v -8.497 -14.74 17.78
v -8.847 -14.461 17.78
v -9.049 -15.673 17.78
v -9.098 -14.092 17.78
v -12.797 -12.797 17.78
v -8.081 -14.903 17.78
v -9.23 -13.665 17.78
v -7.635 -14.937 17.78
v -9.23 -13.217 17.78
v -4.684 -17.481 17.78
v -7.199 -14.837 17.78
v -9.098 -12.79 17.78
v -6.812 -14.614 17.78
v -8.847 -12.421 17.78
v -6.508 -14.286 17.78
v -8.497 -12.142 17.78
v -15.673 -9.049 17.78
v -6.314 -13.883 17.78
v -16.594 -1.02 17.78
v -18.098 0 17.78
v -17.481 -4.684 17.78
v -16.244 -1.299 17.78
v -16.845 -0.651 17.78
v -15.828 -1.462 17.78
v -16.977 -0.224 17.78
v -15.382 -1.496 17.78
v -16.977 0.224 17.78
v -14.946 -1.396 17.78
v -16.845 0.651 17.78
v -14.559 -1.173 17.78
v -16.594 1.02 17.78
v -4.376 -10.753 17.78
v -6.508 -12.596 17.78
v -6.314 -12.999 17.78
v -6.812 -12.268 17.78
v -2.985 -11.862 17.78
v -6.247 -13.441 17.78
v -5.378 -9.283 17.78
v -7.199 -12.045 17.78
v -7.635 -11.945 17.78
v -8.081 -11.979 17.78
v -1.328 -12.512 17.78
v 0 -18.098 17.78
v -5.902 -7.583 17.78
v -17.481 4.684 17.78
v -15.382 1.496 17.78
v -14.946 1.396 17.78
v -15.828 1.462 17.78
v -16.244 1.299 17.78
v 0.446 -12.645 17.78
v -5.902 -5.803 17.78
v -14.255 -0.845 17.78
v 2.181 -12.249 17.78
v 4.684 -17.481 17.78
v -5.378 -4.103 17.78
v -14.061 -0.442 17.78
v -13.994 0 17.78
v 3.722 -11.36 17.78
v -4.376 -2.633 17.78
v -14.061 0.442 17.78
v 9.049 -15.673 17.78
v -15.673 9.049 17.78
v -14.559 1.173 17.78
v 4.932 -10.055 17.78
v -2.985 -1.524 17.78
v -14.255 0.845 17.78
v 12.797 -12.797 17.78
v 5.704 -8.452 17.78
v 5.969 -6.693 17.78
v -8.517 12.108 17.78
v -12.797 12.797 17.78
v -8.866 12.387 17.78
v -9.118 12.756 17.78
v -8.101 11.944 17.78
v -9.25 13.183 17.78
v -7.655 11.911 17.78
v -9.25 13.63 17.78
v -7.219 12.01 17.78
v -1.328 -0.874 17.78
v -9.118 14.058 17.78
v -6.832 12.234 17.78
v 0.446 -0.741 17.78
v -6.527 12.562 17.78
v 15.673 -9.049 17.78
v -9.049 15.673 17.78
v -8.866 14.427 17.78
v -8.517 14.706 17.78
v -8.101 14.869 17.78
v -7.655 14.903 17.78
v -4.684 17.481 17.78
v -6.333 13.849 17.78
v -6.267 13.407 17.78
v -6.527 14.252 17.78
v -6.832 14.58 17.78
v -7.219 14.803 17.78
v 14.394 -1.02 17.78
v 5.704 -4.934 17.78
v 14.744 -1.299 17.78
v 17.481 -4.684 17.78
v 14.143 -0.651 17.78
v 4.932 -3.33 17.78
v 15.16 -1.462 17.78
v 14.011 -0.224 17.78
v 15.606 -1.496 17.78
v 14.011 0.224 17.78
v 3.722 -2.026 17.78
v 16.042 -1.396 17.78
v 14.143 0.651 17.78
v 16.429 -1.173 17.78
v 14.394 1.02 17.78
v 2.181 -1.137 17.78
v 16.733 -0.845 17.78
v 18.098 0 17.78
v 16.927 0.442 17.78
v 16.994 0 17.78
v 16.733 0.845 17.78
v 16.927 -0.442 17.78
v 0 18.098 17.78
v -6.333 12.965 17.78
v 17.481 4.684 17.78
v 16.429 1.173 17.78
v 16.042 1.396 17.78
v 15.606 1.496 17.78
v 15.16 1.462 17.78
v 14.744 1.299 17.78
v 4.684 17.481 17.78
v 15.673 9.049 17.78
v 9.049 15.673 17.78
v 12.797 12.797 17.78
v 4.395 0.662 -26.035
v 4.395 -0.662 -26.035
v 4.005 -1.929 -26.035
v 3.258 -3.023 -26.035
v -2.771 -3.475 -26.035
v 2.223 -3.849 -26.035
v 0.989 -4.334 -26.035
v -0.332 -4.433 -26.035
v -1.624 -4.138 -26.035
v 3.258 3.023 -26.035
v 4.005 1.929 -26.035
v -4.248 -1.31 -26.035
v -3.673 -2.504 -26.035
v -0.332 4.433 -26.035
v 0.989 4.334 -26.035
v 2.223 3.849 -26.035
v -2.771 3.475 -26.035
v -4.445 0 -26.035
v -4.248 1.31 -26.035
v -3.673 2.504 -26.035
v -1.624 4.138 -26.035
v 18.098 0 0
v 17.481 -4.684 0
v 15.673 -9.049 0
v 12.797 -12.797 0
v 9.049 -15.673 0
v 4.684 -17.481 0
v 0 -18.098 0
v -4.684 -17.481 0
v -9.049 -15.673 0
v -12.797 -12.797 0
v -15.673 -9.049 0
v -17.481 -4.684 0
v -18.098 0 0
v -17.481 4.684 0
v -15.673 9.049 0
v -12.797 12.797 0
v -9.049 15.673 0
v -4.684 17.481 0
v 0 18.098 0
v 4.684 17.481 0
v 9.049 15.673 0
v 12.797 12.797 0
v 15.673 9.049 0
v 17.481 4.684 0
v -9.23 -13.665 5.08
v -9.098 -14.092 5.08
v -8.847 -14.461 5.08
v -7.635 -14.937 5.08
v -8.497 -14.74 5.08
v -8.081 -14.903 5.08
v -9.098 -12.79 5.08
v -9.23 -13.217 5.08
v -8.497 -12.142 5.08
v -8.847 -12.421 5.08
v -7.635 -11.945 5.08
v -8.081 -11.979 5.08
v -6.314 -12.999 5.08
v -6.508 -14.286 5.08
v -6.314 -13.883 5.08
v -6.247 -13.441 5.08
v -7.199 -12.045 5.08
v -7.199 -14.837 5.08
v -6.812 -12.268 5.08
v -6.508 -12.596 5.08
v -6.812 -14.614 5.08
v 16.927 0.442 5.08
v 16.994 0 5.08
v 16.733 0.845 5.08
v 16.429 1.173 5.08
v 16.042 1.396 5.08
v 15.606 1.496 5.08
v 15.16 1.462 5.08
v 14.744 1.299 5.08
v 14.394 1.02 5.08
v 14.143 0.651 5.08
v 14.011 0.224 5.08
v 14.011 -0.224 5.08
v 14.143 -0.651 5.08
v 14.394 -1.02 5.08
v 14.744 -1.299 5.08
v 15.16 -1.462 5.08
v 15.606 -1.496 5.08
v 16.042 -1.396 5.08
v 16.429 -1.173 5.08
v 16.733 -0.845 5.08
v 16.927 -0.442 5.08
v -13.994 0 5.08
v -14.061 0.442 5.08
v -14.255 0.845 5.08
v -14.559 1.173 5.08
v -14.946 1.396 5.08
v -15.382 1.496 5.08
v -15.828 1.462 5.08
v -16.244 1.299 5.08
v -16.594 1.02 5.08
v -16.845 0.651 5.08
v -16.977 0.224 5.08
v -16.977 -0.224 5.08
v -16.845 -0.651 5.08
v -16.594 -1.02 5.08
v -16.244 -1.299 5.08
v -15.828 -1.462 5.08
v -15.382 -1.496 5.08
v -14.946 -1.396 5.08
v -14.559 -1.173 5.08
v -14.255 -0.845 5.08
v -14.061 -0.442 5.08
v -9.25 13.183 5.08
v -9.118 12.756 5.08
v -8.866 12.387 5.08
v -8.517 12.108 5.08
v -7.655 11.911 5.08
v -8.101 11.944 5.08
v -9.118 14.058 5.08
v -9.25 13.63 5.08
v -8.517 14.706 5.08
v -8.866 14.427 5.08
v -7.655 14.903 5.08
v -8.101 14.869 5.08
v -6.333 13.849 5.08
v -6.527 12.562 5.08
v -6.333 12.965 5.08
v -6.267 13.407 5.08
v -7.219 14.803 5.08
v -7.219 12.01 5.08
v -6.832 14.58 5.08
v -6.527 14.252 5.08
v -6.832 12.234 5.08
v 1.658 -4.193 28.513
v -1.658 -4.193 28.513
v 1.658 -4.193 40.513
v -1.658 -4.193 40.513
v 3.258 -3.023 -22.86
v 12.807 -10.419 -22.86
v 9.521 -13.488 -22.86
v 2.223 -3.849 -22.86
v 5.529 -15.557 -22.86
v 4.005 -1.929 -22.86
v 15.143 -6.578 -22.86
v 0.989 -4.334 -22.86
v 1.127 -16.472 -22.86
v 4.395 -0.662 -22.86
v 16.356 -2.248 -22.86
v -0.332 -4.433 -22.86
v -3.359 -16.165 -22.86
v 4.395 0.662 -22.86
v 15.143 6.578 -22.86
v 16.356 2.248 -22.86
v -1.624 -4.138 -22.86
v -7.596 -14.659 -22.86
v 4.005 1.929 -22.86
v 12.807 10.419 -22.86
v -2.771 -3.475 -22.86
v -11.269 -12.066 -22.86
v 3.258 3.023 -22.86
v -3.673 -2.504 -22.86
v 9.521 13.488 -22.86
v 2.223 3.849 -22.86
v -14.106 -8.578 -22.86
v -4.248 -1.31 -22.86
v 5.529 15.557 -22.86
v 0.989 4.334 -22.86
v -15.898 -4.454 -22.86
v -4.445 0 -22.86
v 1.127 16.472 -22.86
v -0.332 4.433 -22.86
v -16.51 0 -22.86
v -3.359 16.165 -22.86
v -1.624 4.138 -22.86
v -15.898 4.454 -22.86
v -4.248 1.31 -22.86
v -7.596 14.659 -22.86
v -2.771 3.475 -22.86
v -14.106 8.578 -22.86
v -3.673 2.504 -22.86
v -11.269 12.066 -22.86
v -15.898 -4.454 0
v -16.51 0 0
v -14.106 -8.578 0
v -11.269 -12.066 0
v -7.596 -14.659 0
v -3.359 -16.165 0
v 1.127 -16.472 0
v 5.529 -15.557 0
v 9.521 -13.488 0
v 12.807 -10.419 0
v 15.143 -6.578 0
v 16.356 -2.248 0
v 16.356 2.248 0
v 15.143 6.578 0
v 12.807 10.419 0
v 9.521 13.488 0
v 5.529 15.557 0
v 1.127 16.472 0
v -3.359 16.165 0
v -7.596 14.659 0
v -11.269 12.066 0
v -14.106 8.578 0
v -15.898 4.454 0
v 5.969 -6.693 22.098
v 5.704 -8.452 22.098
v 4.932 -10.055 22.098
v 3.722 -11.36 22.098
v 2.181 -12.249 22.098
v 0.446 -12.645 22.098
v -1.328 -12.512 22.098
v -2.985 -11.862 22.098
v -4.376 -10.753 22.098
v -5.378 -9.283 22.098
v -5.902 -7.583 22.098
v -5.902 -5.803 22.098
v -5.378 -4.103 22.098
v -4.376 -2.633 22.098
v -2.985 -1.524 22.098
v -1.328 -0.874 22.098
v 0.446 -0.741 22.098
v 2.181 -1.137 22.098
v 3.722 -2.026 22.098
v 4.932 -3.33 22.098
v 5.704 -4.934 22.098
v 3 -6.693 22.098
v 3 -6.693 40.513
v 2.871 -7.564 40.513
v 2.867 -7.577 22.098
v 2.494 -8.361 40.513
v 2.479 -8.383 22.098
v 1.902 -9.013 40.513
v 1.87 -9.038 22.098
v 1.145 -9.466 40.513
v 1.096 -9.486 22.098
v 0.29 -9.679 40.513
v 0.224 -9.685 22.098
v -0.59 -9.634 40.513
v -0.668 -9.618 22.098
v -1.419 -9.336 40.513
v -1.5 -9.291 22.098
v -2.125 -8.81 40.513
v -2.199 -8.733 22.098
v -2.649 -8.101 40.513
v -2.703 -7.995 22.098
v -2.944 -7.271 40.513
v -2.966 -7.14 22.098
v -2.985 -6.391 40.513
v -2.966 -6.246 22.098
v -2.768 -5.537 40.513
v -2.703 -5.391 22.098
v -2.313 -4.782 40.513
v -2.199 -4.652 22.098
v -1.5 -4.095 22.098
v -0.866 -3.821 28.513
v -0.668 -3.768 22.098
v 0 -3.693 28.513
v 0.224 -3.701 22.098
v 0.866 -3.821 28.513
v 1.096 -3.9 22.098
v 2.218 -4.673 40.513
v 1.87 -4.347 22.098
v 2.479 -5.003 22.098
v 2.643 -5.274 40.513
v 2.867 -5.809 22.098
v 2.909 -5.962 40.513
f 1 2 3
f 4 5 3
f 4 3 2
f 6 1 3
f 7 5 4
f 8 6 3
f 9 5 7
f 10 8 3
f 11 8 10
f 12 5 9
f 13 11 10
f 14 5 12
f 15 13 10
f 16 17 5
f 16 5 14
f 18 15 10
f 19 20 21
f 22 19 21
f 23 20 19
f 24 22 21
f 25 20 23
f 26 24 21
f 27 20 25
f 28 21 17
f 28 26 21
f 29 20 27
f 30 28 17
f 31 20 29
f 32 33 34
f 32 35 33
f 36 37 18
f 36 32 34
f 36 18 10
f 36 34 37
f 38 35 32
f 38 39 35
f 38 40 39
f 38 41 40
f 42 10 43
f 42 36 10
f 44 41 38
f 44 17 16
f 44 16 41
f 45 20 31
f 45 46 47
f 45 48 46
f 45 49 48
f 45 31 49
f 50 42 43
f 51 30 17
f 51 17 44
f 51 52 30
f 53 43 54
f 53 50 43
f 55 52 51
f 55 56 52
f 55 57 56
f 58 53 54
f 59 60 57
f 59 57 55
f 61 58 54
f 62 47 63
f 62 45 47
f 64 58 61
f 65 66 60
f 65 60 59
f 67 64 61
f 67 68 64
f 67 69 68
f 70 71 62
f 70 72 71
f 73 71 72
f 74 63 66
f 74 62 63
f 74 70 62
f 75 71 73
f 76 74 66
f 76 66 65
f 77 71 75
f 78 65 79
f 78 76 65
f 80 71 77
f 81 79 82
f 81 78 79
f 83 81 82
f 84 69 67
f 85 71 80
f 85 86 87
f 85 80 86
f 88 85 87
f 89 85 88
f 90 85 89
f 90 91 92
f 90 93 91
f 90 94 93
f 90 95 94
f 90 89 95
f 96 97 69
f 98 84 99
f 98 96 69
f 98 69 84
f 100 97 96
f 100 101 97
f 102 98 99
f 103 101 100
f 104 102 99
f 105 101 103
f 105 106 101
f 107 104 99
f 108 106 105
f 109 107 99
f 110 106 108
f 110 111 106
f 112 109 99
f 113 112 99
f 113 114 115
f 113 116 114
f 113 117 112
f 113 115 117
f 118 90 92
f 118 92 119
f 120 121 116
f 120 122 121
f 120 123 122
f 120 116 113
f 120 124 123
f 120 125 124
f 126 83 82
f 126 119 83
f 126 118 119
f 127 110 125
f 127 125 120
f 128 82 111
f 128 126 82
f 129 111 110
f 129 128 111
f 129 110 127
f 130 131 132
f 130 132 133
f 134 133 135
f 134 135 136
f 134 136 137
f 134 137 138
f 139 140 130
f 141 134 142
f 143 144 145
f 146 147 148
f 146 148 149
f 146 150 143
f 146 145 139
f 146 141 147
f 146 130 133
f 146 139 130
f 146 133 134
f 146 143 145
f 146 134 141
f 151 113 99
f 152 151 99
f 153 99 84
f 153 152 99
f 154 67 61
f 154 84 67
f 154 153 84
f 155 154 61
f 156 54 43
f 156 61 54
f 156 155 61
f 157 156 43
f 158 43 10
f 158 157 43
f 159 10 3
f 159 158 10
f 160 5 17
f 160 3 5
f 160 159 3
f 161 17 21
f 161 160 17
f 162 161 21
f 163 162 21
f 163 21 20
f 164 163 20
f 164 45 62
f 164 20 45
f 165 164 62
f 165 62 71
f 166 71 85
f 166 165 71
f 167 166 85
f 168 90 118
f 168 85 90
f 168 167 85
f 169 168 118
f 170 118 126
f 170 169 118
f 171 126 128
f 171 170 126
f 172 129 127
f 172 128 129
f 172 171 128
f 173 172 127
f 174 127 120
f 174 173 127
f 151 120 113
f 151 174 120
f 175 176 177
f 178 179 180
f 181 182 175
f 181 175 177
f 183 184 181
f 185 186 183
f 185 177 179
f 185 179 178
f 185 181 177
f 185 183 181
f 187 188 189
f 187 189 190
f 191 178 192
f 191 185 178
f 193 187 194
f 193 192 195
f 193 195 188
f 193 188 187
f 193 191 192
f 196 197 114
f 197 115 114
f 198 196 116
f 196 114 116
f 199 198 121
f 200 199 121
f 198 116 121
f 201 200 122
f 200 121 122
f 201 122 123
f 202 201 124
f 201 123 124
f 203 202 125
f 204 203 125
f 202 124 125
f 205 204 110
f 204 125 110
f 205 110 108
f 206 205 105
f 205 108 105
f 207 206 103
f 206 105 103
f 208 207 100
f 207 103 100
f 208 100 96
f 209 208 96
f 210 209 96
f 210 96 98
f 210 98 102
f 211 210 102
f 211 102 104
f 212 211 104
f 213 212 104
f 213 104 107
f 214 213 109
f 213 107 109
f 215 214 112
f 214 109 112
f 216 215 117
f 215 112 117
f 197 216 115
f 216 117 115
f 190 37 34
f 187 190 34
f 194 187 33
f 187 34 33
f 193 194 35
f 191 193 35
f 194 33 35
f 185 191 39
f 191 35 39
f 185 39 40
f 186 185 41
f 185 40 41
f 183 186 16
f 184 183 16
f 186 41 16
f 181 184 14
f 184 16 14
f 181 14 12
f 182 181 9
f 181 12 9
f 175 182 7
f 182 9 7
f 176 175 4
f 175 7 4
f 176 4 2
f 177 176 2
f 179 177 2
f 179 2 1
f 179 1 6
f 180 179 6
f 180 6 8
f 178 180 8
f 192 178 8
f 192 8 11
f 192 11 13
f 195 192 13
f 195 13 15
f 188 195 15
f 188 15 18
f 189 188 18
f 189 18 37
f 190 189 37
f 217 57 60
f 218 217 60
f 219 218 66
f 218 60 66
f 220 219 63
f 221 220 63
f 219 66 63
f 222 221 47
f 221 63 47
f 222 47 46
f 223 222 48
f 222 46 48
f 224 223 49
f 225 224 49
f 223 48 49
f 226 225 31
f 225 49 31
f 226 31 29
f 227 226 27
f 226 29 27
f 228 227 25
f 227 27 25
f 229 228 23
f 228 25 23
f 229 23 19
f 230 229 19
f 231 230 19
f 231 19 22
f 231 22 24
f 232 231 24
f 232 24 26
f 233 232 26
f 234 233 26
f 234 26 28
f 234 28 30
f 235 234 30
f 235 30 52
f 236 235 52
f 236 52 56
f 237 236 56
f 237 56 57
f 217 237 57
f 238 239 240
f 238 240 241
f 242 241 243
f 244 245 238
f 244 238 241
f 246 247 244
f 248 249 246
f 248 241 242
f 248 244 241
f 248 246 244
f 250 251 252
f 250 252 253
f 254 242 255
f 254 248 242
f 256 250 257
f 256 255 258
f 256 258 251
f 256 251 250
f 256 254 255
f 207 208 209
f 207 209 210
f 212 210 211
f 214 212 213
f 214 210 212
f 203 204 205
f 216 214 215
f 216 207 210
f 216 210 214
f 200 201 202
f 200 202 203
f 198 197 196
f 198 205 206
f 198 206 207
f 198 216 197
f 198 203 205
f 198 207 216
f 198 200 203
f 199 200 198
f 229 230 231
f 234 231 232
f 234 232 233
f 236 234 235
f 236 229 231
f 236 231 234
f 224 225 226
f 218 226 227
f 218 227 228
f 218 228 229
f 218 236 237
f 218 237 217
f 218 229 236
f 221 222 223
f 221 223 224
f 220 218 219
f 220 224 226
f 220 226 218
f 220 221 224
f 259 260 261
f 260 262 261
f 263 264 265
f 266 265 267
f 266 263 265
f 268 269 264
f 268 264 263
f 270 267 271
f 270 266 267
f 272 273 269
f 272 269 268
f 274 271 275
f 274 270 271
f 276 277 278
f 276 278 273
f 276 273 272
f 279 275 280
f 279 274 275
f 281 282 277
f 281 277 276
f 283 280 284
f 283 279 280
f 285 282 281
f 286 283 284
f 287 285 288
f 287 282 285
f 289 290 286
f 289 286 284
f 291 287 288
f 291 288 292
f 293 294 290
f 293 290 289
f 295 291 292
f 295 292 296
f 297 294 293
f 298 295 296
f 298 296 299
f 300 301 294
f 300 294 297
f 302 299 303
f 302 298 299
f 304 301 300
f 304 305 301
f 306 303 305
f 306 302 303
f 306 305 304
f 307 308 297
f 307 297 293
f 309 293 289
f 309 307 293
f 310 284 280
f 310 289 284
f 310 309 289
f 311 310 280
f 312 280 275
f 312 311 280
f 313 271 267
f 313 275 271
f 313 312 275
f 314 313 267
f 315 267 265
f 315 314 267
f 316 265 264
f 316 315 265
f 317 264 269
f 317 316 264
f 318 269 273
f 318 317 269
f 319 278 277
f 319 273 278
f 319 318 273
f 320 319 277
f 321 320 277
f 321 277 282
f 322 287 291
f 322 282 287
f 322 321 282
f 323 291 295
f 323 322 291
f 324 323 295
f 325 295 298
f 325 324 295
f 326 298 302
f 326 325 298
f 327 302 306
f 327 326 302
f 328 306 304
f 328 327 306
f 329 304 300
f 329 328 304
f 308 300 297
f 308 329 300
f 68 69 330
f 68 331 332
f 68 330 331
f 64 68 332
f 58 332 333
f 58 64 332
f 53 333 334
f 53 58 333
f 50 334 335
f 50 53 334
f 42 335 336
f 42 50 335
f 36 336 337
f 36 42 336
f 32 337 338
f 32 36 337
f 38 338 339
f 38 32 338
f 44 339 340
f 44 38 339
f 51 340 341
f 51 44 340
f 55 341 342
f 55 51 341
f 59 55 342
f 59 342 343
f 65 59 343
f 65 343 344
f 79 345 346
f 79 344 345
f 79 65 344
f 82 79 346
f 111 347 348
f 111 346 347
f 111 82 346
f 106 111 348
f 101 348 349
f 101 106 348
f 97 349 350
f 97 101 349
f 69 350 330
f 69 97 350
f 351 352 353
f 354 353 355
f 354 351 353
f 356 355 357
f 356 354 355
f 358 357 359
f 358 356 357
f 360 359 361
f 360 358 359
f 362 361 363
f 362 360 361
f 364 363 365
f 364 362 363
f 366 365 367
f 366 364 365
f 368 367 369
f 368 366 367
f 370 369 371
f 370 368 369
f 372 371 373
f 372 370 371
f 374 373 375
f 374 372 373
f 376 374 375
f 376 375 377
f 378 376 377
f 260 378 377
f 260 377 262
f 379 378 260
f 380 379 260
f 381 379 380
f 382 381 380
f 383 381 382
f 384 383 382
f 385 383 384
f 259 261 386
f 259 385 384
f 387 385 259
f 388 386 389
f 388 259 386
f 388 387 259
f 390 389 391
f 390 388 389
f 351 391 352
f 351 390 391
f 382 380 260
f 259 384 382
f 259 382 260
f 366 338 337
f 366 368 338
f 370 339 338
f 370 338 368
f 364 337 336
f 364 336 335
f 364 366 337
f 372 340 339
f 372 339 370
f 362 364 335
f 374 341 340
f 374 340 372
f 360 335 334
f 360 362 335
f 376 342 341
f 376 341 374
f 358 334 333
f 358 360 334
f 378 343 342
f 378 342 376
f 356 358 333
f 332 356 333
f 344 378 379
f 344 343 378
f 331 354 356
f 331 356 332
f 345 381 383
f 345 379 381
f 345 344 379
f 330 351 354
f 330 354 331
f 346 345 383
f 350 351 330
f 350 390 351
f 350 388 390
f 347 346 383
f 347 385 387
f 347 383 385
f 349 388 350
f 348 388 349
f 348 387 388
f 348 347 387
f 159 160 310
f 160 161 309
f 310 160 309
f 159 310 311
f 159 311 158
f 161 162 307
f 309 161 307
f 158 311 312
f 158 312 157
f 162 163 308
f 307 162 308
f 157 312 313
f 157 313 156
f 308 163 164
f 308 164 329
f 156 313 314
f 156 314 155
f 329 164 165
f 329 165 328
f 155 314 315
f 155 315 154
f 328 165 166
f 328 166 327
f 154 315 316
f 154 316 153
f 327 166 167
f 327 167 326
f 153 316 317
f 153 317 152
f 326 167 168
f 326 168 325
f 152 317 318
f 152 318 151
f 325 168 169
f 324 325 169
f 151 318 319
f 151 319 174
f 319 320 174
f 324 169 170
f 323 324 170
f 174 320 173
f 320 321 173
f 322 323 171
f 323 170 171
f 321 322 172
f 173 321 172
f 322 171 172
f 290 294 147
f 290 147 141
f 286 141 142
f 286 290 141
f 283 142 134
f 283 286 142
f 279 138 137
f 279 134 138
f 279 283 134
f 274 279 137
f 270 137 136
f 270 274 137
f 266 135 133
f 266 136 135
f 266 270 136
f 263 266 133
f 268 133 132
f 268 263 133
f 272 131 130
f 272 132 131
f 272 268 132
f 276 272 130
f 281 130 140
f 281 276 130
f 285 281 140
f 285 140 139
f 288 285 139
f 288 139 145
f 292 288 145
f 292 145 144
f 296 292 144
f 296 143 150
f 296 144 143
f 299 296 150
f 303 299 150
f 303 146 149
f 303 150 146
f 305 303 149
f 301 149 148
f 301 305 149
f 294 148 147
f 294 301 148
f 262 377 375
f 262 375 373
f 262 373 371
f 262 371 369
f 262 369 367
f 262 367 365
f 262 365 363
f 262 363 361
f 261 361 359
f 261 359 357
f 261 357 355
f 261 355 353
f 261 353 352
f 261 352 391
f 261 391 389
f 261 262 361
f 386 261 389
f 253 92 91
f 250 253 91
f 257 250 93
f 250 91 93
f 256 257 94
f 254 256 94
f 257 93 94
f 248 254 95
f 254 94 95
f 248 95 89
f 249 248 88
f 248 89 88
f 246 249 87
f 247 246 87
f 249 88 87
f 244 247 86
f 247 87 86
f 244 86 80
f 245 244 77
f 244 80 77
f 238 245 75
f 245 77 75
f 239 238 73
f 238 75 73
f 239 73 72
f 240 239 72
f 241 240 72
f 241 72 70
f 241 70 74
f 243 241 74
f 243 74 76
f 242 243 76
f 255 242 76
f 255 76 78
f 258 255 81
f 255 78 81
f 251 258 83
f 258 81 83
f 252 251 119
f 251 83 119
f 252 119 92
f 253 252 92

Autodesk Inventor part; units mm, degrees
ref_plane "YZ Plane" through (0, 0, 0) normal (1, 0, 0) x (0, 1, 0)
ref_plane "XZ Plane" through (0, 0, 0) normal (0, 1, 0) x (-1, 0, 0)
ref_plane "XY Plane" through (0, 0, 0) normal (0, 0, 1) x (1, 0, 0)
sketch "Sketch1" plane through (0, 0, 0) normal (0, 0, 1) x (1, 0, 0)
  circle A0 centre (0, 0) radius 18.0975
  dimension "d0" = 36.195
extrude "Extrusion1" add sketch "Sketch1" along normal blind 17.78
sketch "Sketch2" plane through (0, 0, 17.78) normal (0, 0, 1) x (1, 0, 0)
  circle A0 centre (0, 0) radius 18.0975 projected
  line L0 (0, -18.0975) -> (0, -6.6929) construction
  circle A1 centre (0, -6.6929) radius 5.969
  dimension "d3" = 11.4046
  dimension "d4" = 11.938
extrude "Extrusion2" add sketch "Sketch2" along normal blind 4.318 contours A1
sketch "Sketch3" plane through (0, -6.6929, 22.098) normal (0, 0, 1) x (1, 0, 0)
  circle A0 centre (0, 0) radius 5.969 projected
  circle A1 centre (0, 0) radius 3
  point P0 (0, 6.6929)
  dimension "d7" = 6
extrude "Extrusion3" add sketch "Sketch3" along normal blind 18.415 contours A1
sketch "Sketch4" plane through (0, -6.6929, 40.513) normal (0, 0, 1) x (1, 0, 0)
  circle A0 centre (0, 0) radius 3 projected
  arc A1 (1.6583, 2.5) -> (-1.6583, 2.5) centre (0, 0) ccw
  line L0 (-1.6583, 2.5) -> (1.6583, 2.5)
  point P0 (0, 6.6929)
extrude "Extrusion4" cut sketch "Sketch4" against normal blind 12 contours L0 A0 picked at (-0.1169, 2.6598)
sketch "Sketch5" plane through (0, 0, 0) normal (0, 0, -1) x (-1, 0, 0)
  circle A0 centre (0, 0) radius 18.0975 projected
  circle A1 centre (0, 0) radius 16.51
  dimension "d13" = 33.02
extrude "Extrusion5" add sketch "Sketch5" along normal blind 22.86 contours A1
sketch "Sketch6" plane through (0, 0, -22.86) normal (0, 0, -1) x (-1, 0, 0)
  circle A0 centre (0, 0) radius 16.51 projected
  circle A1 centre (0, 0) radius 4.445
  dimension "d16" = 8.89
extrude "Extrusion6" add sketch "Sketch6" along normal blind 3.175 contours A1
sketch "Sketch7" plane through (0, 0, 17.78) normal (0, 0, 1) x (1, 0, 0)
  circle A0 centre (0, 0) radius 18.0975 projected
  circle A1 centre (-15.494, 0) radius 1.5
  circle A2 centre (15.494, 0) radius 1.5
  circle A3 centre (0, 0) radius 15.494 construction
  circle A4 centre (15.494, 0) radius 26.8478 construction
  circle A5 centre (-7.7668, 13.4068) radius 26.8478 construction
  circle A6 centre (-7.7668, 13.4068) radius 1.5
  circle A7 centre (-7.747, -13.441) radius 1.5
  dimension "d24" = 53.6956
  dimension "d21" = 3
  dimension "d22" = 3
  dimension "d23" = 53.6956
  dimension "d25" = 3
  dimension "d26" = 3
extrude "Extrusion7" cut sketch "Sketch7" against normal blind 12.7 contours A1 | A2 | A6 | A7
thread "Thread1" size "M3x0.5" class "6H" standard "ISO Metric profile" full length
thread "Thread2" size "5-40 UNC" class "2B" standard "ANSI Unified Screw Threads" full length
thread "Thread3" size "5-40 UNC" class "2B" standard "ANSI Unified Screw Threads" full length
thread "Thread4" size "5-40 UNC" class "2B" standard "ANSI Unified Screw Threads" full length
properties part number "Drive Motor"
